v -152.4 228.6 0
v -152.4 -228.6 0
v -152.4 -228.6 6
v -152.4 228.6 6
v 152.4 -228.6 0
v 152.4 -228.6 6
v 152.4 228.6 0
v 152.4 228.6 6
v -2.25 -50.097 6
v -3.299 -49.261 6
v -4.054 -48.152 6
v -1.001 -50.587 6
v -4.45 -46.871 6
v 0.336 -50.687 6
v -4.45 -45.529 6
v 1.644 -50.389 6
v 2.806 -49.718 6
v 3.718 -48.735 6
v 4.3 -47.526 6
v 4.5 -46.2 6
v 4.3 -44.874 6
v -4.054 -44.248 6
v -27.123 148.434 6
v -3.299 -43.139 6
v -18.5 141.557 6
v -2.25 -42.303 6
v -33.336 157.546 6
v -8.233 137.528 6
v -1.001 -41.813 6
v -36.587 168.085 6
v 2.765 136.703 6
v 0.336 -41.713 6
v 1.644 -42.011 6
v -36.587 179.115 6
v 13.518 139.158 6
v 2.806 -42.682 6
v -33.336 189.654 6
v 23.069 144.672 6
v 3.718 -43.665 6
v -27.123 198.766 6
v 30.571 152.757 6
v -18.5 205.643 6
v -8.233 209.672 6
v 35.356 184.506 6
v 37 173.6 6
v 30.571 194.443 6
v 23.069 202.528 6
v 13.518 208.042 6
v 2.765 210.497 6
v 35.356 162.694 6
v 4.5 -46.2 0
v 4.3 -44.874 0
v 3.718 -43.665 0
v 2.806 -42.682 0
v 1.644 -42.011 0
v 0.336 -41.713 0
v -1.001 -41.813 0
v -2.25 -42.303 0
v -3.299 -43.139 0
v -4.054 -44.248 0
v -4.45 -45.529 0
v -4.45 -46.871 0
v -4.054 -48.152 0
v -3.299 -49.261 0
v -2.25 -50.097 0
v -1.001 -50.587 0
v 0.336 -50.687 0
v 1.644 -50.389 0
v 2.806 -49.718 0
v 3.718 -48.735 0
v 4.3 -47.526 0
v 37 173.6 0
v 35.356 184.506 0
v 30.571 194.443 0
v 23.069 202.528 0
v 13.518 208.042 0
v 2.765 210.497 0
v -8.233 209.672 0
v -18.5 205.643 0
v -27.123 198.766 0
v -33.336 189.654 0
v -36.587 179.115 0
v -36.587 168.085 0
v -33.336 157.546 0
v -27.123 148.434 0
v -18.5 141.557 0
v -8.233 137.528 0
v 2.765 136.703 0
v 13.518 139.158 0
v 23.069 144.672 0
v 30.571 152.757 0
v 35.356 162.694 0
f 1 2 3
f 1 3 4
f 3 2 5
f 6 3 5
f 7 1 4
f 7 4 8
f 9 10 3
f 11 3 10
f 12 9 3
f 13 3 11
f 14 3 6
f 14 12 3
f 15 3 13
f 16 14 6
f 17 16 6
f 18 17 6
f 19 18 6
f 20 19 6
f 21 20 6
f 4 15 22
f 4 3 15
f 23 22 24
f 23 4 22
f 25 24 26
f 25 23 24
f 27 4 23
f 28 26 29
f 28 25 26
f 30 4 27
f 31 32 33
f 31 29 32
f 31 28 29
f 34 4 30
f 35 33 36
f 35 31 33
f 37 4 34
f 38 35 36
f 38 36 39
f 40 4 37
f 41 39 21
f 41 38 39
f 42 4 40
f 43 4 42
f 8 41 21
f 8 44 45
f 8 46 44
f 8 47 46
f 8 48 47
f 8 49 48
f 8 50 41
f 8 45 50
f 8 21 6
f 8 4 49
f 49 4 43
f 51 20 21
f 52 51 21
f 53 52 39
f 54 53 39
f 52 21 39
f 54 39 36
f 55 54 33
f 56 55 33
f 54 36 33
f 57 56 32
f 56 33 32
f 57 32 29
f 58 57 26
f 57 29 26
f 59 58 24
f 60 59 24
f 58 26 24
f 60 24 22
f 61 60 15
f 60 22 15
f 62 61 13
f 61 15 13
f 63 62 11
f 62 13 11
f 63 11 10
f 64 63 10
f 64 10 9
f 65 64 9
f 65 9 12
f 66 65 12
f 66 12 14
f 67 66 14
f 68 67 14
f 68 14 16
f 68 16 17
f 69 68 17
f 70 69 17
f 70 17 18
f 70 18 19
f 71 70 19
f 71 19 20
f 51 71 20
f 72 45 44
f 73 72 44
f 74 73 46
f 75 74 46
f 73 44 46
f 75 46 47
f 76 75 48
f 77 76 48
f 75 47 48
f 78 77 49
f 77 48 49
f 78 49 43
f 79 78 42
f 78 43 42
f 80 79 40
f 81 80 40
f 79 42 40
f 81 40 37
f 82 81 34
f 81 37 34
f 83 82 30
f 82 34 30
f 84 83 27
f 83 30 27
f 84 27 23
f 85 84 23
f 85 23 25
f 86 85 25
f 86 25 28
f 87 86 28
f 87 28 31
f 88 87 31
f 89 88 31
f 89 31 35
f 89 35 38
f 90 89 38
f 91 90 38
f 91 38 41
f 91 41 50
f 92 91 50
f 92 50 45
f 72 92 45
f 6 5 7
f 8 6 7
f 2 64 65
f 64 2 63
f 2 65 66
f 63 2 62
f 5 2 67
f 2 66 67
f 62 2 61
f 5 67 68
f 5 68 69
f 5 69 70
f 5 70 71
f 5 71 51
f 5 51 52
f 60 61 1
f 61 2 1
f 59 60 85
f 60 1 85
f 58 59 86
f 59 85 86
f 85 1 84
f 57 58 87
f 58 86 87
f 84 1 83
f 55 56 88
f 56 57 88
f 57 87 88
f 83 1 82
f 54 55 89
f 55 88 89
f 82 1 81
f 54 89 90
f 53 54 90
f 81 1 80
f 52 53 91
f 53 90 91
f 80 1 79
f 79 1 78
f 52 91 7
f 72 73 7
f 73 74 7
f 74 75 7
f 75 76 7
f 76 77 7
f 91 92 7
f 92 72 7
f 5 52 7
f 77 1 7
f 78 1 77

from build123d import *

# Parameters (mm, degrees)
SKETCH1_W           = 304.8
SKETCH1_H           = 457.2
BOSS_EXTRUDE1_DEPTH = 6
SKETCH2_R           = 37
CUT_EXTRUDE1_DEPTH  = 275.808515152
SKETCH3_R           = 4.5
CUT_EXTRUDE2_DEPTH  = 275.808515152


with BuildPart() as part:
    # Sketch1 → Boss-Extrude1 (new body)
    with BuildSketch(Plane.XY):
        Rectangle(SKETCH1_W, SKETCH1_H)
    extrude(amount=BOSS_EXTRUDE1_DEPTH)

    # Sketch2 → Cut-Extrude1 (cut, through all)
    with BuildSketch(Plane.XY.offset(6)):
        with Locations((0, 173.6)):
            Circle(SKETCH2_R)
    extrude(amount=-CUT_EXTRUDE1_DEPTH, mode=Mode.SUBTRACT)

    # Sketch3 → Cut-Extrude2 (cut, through all)
    with BuildSketch(Plane.XY.offset(6)):
        with Locations((0, -46.2)):
            Circle(SKETCH3_R)
    extrude(amount=-CUT_EXTRUDE2_DEPTH, mode=Mode.SUBTRACT)


solid = part.part
